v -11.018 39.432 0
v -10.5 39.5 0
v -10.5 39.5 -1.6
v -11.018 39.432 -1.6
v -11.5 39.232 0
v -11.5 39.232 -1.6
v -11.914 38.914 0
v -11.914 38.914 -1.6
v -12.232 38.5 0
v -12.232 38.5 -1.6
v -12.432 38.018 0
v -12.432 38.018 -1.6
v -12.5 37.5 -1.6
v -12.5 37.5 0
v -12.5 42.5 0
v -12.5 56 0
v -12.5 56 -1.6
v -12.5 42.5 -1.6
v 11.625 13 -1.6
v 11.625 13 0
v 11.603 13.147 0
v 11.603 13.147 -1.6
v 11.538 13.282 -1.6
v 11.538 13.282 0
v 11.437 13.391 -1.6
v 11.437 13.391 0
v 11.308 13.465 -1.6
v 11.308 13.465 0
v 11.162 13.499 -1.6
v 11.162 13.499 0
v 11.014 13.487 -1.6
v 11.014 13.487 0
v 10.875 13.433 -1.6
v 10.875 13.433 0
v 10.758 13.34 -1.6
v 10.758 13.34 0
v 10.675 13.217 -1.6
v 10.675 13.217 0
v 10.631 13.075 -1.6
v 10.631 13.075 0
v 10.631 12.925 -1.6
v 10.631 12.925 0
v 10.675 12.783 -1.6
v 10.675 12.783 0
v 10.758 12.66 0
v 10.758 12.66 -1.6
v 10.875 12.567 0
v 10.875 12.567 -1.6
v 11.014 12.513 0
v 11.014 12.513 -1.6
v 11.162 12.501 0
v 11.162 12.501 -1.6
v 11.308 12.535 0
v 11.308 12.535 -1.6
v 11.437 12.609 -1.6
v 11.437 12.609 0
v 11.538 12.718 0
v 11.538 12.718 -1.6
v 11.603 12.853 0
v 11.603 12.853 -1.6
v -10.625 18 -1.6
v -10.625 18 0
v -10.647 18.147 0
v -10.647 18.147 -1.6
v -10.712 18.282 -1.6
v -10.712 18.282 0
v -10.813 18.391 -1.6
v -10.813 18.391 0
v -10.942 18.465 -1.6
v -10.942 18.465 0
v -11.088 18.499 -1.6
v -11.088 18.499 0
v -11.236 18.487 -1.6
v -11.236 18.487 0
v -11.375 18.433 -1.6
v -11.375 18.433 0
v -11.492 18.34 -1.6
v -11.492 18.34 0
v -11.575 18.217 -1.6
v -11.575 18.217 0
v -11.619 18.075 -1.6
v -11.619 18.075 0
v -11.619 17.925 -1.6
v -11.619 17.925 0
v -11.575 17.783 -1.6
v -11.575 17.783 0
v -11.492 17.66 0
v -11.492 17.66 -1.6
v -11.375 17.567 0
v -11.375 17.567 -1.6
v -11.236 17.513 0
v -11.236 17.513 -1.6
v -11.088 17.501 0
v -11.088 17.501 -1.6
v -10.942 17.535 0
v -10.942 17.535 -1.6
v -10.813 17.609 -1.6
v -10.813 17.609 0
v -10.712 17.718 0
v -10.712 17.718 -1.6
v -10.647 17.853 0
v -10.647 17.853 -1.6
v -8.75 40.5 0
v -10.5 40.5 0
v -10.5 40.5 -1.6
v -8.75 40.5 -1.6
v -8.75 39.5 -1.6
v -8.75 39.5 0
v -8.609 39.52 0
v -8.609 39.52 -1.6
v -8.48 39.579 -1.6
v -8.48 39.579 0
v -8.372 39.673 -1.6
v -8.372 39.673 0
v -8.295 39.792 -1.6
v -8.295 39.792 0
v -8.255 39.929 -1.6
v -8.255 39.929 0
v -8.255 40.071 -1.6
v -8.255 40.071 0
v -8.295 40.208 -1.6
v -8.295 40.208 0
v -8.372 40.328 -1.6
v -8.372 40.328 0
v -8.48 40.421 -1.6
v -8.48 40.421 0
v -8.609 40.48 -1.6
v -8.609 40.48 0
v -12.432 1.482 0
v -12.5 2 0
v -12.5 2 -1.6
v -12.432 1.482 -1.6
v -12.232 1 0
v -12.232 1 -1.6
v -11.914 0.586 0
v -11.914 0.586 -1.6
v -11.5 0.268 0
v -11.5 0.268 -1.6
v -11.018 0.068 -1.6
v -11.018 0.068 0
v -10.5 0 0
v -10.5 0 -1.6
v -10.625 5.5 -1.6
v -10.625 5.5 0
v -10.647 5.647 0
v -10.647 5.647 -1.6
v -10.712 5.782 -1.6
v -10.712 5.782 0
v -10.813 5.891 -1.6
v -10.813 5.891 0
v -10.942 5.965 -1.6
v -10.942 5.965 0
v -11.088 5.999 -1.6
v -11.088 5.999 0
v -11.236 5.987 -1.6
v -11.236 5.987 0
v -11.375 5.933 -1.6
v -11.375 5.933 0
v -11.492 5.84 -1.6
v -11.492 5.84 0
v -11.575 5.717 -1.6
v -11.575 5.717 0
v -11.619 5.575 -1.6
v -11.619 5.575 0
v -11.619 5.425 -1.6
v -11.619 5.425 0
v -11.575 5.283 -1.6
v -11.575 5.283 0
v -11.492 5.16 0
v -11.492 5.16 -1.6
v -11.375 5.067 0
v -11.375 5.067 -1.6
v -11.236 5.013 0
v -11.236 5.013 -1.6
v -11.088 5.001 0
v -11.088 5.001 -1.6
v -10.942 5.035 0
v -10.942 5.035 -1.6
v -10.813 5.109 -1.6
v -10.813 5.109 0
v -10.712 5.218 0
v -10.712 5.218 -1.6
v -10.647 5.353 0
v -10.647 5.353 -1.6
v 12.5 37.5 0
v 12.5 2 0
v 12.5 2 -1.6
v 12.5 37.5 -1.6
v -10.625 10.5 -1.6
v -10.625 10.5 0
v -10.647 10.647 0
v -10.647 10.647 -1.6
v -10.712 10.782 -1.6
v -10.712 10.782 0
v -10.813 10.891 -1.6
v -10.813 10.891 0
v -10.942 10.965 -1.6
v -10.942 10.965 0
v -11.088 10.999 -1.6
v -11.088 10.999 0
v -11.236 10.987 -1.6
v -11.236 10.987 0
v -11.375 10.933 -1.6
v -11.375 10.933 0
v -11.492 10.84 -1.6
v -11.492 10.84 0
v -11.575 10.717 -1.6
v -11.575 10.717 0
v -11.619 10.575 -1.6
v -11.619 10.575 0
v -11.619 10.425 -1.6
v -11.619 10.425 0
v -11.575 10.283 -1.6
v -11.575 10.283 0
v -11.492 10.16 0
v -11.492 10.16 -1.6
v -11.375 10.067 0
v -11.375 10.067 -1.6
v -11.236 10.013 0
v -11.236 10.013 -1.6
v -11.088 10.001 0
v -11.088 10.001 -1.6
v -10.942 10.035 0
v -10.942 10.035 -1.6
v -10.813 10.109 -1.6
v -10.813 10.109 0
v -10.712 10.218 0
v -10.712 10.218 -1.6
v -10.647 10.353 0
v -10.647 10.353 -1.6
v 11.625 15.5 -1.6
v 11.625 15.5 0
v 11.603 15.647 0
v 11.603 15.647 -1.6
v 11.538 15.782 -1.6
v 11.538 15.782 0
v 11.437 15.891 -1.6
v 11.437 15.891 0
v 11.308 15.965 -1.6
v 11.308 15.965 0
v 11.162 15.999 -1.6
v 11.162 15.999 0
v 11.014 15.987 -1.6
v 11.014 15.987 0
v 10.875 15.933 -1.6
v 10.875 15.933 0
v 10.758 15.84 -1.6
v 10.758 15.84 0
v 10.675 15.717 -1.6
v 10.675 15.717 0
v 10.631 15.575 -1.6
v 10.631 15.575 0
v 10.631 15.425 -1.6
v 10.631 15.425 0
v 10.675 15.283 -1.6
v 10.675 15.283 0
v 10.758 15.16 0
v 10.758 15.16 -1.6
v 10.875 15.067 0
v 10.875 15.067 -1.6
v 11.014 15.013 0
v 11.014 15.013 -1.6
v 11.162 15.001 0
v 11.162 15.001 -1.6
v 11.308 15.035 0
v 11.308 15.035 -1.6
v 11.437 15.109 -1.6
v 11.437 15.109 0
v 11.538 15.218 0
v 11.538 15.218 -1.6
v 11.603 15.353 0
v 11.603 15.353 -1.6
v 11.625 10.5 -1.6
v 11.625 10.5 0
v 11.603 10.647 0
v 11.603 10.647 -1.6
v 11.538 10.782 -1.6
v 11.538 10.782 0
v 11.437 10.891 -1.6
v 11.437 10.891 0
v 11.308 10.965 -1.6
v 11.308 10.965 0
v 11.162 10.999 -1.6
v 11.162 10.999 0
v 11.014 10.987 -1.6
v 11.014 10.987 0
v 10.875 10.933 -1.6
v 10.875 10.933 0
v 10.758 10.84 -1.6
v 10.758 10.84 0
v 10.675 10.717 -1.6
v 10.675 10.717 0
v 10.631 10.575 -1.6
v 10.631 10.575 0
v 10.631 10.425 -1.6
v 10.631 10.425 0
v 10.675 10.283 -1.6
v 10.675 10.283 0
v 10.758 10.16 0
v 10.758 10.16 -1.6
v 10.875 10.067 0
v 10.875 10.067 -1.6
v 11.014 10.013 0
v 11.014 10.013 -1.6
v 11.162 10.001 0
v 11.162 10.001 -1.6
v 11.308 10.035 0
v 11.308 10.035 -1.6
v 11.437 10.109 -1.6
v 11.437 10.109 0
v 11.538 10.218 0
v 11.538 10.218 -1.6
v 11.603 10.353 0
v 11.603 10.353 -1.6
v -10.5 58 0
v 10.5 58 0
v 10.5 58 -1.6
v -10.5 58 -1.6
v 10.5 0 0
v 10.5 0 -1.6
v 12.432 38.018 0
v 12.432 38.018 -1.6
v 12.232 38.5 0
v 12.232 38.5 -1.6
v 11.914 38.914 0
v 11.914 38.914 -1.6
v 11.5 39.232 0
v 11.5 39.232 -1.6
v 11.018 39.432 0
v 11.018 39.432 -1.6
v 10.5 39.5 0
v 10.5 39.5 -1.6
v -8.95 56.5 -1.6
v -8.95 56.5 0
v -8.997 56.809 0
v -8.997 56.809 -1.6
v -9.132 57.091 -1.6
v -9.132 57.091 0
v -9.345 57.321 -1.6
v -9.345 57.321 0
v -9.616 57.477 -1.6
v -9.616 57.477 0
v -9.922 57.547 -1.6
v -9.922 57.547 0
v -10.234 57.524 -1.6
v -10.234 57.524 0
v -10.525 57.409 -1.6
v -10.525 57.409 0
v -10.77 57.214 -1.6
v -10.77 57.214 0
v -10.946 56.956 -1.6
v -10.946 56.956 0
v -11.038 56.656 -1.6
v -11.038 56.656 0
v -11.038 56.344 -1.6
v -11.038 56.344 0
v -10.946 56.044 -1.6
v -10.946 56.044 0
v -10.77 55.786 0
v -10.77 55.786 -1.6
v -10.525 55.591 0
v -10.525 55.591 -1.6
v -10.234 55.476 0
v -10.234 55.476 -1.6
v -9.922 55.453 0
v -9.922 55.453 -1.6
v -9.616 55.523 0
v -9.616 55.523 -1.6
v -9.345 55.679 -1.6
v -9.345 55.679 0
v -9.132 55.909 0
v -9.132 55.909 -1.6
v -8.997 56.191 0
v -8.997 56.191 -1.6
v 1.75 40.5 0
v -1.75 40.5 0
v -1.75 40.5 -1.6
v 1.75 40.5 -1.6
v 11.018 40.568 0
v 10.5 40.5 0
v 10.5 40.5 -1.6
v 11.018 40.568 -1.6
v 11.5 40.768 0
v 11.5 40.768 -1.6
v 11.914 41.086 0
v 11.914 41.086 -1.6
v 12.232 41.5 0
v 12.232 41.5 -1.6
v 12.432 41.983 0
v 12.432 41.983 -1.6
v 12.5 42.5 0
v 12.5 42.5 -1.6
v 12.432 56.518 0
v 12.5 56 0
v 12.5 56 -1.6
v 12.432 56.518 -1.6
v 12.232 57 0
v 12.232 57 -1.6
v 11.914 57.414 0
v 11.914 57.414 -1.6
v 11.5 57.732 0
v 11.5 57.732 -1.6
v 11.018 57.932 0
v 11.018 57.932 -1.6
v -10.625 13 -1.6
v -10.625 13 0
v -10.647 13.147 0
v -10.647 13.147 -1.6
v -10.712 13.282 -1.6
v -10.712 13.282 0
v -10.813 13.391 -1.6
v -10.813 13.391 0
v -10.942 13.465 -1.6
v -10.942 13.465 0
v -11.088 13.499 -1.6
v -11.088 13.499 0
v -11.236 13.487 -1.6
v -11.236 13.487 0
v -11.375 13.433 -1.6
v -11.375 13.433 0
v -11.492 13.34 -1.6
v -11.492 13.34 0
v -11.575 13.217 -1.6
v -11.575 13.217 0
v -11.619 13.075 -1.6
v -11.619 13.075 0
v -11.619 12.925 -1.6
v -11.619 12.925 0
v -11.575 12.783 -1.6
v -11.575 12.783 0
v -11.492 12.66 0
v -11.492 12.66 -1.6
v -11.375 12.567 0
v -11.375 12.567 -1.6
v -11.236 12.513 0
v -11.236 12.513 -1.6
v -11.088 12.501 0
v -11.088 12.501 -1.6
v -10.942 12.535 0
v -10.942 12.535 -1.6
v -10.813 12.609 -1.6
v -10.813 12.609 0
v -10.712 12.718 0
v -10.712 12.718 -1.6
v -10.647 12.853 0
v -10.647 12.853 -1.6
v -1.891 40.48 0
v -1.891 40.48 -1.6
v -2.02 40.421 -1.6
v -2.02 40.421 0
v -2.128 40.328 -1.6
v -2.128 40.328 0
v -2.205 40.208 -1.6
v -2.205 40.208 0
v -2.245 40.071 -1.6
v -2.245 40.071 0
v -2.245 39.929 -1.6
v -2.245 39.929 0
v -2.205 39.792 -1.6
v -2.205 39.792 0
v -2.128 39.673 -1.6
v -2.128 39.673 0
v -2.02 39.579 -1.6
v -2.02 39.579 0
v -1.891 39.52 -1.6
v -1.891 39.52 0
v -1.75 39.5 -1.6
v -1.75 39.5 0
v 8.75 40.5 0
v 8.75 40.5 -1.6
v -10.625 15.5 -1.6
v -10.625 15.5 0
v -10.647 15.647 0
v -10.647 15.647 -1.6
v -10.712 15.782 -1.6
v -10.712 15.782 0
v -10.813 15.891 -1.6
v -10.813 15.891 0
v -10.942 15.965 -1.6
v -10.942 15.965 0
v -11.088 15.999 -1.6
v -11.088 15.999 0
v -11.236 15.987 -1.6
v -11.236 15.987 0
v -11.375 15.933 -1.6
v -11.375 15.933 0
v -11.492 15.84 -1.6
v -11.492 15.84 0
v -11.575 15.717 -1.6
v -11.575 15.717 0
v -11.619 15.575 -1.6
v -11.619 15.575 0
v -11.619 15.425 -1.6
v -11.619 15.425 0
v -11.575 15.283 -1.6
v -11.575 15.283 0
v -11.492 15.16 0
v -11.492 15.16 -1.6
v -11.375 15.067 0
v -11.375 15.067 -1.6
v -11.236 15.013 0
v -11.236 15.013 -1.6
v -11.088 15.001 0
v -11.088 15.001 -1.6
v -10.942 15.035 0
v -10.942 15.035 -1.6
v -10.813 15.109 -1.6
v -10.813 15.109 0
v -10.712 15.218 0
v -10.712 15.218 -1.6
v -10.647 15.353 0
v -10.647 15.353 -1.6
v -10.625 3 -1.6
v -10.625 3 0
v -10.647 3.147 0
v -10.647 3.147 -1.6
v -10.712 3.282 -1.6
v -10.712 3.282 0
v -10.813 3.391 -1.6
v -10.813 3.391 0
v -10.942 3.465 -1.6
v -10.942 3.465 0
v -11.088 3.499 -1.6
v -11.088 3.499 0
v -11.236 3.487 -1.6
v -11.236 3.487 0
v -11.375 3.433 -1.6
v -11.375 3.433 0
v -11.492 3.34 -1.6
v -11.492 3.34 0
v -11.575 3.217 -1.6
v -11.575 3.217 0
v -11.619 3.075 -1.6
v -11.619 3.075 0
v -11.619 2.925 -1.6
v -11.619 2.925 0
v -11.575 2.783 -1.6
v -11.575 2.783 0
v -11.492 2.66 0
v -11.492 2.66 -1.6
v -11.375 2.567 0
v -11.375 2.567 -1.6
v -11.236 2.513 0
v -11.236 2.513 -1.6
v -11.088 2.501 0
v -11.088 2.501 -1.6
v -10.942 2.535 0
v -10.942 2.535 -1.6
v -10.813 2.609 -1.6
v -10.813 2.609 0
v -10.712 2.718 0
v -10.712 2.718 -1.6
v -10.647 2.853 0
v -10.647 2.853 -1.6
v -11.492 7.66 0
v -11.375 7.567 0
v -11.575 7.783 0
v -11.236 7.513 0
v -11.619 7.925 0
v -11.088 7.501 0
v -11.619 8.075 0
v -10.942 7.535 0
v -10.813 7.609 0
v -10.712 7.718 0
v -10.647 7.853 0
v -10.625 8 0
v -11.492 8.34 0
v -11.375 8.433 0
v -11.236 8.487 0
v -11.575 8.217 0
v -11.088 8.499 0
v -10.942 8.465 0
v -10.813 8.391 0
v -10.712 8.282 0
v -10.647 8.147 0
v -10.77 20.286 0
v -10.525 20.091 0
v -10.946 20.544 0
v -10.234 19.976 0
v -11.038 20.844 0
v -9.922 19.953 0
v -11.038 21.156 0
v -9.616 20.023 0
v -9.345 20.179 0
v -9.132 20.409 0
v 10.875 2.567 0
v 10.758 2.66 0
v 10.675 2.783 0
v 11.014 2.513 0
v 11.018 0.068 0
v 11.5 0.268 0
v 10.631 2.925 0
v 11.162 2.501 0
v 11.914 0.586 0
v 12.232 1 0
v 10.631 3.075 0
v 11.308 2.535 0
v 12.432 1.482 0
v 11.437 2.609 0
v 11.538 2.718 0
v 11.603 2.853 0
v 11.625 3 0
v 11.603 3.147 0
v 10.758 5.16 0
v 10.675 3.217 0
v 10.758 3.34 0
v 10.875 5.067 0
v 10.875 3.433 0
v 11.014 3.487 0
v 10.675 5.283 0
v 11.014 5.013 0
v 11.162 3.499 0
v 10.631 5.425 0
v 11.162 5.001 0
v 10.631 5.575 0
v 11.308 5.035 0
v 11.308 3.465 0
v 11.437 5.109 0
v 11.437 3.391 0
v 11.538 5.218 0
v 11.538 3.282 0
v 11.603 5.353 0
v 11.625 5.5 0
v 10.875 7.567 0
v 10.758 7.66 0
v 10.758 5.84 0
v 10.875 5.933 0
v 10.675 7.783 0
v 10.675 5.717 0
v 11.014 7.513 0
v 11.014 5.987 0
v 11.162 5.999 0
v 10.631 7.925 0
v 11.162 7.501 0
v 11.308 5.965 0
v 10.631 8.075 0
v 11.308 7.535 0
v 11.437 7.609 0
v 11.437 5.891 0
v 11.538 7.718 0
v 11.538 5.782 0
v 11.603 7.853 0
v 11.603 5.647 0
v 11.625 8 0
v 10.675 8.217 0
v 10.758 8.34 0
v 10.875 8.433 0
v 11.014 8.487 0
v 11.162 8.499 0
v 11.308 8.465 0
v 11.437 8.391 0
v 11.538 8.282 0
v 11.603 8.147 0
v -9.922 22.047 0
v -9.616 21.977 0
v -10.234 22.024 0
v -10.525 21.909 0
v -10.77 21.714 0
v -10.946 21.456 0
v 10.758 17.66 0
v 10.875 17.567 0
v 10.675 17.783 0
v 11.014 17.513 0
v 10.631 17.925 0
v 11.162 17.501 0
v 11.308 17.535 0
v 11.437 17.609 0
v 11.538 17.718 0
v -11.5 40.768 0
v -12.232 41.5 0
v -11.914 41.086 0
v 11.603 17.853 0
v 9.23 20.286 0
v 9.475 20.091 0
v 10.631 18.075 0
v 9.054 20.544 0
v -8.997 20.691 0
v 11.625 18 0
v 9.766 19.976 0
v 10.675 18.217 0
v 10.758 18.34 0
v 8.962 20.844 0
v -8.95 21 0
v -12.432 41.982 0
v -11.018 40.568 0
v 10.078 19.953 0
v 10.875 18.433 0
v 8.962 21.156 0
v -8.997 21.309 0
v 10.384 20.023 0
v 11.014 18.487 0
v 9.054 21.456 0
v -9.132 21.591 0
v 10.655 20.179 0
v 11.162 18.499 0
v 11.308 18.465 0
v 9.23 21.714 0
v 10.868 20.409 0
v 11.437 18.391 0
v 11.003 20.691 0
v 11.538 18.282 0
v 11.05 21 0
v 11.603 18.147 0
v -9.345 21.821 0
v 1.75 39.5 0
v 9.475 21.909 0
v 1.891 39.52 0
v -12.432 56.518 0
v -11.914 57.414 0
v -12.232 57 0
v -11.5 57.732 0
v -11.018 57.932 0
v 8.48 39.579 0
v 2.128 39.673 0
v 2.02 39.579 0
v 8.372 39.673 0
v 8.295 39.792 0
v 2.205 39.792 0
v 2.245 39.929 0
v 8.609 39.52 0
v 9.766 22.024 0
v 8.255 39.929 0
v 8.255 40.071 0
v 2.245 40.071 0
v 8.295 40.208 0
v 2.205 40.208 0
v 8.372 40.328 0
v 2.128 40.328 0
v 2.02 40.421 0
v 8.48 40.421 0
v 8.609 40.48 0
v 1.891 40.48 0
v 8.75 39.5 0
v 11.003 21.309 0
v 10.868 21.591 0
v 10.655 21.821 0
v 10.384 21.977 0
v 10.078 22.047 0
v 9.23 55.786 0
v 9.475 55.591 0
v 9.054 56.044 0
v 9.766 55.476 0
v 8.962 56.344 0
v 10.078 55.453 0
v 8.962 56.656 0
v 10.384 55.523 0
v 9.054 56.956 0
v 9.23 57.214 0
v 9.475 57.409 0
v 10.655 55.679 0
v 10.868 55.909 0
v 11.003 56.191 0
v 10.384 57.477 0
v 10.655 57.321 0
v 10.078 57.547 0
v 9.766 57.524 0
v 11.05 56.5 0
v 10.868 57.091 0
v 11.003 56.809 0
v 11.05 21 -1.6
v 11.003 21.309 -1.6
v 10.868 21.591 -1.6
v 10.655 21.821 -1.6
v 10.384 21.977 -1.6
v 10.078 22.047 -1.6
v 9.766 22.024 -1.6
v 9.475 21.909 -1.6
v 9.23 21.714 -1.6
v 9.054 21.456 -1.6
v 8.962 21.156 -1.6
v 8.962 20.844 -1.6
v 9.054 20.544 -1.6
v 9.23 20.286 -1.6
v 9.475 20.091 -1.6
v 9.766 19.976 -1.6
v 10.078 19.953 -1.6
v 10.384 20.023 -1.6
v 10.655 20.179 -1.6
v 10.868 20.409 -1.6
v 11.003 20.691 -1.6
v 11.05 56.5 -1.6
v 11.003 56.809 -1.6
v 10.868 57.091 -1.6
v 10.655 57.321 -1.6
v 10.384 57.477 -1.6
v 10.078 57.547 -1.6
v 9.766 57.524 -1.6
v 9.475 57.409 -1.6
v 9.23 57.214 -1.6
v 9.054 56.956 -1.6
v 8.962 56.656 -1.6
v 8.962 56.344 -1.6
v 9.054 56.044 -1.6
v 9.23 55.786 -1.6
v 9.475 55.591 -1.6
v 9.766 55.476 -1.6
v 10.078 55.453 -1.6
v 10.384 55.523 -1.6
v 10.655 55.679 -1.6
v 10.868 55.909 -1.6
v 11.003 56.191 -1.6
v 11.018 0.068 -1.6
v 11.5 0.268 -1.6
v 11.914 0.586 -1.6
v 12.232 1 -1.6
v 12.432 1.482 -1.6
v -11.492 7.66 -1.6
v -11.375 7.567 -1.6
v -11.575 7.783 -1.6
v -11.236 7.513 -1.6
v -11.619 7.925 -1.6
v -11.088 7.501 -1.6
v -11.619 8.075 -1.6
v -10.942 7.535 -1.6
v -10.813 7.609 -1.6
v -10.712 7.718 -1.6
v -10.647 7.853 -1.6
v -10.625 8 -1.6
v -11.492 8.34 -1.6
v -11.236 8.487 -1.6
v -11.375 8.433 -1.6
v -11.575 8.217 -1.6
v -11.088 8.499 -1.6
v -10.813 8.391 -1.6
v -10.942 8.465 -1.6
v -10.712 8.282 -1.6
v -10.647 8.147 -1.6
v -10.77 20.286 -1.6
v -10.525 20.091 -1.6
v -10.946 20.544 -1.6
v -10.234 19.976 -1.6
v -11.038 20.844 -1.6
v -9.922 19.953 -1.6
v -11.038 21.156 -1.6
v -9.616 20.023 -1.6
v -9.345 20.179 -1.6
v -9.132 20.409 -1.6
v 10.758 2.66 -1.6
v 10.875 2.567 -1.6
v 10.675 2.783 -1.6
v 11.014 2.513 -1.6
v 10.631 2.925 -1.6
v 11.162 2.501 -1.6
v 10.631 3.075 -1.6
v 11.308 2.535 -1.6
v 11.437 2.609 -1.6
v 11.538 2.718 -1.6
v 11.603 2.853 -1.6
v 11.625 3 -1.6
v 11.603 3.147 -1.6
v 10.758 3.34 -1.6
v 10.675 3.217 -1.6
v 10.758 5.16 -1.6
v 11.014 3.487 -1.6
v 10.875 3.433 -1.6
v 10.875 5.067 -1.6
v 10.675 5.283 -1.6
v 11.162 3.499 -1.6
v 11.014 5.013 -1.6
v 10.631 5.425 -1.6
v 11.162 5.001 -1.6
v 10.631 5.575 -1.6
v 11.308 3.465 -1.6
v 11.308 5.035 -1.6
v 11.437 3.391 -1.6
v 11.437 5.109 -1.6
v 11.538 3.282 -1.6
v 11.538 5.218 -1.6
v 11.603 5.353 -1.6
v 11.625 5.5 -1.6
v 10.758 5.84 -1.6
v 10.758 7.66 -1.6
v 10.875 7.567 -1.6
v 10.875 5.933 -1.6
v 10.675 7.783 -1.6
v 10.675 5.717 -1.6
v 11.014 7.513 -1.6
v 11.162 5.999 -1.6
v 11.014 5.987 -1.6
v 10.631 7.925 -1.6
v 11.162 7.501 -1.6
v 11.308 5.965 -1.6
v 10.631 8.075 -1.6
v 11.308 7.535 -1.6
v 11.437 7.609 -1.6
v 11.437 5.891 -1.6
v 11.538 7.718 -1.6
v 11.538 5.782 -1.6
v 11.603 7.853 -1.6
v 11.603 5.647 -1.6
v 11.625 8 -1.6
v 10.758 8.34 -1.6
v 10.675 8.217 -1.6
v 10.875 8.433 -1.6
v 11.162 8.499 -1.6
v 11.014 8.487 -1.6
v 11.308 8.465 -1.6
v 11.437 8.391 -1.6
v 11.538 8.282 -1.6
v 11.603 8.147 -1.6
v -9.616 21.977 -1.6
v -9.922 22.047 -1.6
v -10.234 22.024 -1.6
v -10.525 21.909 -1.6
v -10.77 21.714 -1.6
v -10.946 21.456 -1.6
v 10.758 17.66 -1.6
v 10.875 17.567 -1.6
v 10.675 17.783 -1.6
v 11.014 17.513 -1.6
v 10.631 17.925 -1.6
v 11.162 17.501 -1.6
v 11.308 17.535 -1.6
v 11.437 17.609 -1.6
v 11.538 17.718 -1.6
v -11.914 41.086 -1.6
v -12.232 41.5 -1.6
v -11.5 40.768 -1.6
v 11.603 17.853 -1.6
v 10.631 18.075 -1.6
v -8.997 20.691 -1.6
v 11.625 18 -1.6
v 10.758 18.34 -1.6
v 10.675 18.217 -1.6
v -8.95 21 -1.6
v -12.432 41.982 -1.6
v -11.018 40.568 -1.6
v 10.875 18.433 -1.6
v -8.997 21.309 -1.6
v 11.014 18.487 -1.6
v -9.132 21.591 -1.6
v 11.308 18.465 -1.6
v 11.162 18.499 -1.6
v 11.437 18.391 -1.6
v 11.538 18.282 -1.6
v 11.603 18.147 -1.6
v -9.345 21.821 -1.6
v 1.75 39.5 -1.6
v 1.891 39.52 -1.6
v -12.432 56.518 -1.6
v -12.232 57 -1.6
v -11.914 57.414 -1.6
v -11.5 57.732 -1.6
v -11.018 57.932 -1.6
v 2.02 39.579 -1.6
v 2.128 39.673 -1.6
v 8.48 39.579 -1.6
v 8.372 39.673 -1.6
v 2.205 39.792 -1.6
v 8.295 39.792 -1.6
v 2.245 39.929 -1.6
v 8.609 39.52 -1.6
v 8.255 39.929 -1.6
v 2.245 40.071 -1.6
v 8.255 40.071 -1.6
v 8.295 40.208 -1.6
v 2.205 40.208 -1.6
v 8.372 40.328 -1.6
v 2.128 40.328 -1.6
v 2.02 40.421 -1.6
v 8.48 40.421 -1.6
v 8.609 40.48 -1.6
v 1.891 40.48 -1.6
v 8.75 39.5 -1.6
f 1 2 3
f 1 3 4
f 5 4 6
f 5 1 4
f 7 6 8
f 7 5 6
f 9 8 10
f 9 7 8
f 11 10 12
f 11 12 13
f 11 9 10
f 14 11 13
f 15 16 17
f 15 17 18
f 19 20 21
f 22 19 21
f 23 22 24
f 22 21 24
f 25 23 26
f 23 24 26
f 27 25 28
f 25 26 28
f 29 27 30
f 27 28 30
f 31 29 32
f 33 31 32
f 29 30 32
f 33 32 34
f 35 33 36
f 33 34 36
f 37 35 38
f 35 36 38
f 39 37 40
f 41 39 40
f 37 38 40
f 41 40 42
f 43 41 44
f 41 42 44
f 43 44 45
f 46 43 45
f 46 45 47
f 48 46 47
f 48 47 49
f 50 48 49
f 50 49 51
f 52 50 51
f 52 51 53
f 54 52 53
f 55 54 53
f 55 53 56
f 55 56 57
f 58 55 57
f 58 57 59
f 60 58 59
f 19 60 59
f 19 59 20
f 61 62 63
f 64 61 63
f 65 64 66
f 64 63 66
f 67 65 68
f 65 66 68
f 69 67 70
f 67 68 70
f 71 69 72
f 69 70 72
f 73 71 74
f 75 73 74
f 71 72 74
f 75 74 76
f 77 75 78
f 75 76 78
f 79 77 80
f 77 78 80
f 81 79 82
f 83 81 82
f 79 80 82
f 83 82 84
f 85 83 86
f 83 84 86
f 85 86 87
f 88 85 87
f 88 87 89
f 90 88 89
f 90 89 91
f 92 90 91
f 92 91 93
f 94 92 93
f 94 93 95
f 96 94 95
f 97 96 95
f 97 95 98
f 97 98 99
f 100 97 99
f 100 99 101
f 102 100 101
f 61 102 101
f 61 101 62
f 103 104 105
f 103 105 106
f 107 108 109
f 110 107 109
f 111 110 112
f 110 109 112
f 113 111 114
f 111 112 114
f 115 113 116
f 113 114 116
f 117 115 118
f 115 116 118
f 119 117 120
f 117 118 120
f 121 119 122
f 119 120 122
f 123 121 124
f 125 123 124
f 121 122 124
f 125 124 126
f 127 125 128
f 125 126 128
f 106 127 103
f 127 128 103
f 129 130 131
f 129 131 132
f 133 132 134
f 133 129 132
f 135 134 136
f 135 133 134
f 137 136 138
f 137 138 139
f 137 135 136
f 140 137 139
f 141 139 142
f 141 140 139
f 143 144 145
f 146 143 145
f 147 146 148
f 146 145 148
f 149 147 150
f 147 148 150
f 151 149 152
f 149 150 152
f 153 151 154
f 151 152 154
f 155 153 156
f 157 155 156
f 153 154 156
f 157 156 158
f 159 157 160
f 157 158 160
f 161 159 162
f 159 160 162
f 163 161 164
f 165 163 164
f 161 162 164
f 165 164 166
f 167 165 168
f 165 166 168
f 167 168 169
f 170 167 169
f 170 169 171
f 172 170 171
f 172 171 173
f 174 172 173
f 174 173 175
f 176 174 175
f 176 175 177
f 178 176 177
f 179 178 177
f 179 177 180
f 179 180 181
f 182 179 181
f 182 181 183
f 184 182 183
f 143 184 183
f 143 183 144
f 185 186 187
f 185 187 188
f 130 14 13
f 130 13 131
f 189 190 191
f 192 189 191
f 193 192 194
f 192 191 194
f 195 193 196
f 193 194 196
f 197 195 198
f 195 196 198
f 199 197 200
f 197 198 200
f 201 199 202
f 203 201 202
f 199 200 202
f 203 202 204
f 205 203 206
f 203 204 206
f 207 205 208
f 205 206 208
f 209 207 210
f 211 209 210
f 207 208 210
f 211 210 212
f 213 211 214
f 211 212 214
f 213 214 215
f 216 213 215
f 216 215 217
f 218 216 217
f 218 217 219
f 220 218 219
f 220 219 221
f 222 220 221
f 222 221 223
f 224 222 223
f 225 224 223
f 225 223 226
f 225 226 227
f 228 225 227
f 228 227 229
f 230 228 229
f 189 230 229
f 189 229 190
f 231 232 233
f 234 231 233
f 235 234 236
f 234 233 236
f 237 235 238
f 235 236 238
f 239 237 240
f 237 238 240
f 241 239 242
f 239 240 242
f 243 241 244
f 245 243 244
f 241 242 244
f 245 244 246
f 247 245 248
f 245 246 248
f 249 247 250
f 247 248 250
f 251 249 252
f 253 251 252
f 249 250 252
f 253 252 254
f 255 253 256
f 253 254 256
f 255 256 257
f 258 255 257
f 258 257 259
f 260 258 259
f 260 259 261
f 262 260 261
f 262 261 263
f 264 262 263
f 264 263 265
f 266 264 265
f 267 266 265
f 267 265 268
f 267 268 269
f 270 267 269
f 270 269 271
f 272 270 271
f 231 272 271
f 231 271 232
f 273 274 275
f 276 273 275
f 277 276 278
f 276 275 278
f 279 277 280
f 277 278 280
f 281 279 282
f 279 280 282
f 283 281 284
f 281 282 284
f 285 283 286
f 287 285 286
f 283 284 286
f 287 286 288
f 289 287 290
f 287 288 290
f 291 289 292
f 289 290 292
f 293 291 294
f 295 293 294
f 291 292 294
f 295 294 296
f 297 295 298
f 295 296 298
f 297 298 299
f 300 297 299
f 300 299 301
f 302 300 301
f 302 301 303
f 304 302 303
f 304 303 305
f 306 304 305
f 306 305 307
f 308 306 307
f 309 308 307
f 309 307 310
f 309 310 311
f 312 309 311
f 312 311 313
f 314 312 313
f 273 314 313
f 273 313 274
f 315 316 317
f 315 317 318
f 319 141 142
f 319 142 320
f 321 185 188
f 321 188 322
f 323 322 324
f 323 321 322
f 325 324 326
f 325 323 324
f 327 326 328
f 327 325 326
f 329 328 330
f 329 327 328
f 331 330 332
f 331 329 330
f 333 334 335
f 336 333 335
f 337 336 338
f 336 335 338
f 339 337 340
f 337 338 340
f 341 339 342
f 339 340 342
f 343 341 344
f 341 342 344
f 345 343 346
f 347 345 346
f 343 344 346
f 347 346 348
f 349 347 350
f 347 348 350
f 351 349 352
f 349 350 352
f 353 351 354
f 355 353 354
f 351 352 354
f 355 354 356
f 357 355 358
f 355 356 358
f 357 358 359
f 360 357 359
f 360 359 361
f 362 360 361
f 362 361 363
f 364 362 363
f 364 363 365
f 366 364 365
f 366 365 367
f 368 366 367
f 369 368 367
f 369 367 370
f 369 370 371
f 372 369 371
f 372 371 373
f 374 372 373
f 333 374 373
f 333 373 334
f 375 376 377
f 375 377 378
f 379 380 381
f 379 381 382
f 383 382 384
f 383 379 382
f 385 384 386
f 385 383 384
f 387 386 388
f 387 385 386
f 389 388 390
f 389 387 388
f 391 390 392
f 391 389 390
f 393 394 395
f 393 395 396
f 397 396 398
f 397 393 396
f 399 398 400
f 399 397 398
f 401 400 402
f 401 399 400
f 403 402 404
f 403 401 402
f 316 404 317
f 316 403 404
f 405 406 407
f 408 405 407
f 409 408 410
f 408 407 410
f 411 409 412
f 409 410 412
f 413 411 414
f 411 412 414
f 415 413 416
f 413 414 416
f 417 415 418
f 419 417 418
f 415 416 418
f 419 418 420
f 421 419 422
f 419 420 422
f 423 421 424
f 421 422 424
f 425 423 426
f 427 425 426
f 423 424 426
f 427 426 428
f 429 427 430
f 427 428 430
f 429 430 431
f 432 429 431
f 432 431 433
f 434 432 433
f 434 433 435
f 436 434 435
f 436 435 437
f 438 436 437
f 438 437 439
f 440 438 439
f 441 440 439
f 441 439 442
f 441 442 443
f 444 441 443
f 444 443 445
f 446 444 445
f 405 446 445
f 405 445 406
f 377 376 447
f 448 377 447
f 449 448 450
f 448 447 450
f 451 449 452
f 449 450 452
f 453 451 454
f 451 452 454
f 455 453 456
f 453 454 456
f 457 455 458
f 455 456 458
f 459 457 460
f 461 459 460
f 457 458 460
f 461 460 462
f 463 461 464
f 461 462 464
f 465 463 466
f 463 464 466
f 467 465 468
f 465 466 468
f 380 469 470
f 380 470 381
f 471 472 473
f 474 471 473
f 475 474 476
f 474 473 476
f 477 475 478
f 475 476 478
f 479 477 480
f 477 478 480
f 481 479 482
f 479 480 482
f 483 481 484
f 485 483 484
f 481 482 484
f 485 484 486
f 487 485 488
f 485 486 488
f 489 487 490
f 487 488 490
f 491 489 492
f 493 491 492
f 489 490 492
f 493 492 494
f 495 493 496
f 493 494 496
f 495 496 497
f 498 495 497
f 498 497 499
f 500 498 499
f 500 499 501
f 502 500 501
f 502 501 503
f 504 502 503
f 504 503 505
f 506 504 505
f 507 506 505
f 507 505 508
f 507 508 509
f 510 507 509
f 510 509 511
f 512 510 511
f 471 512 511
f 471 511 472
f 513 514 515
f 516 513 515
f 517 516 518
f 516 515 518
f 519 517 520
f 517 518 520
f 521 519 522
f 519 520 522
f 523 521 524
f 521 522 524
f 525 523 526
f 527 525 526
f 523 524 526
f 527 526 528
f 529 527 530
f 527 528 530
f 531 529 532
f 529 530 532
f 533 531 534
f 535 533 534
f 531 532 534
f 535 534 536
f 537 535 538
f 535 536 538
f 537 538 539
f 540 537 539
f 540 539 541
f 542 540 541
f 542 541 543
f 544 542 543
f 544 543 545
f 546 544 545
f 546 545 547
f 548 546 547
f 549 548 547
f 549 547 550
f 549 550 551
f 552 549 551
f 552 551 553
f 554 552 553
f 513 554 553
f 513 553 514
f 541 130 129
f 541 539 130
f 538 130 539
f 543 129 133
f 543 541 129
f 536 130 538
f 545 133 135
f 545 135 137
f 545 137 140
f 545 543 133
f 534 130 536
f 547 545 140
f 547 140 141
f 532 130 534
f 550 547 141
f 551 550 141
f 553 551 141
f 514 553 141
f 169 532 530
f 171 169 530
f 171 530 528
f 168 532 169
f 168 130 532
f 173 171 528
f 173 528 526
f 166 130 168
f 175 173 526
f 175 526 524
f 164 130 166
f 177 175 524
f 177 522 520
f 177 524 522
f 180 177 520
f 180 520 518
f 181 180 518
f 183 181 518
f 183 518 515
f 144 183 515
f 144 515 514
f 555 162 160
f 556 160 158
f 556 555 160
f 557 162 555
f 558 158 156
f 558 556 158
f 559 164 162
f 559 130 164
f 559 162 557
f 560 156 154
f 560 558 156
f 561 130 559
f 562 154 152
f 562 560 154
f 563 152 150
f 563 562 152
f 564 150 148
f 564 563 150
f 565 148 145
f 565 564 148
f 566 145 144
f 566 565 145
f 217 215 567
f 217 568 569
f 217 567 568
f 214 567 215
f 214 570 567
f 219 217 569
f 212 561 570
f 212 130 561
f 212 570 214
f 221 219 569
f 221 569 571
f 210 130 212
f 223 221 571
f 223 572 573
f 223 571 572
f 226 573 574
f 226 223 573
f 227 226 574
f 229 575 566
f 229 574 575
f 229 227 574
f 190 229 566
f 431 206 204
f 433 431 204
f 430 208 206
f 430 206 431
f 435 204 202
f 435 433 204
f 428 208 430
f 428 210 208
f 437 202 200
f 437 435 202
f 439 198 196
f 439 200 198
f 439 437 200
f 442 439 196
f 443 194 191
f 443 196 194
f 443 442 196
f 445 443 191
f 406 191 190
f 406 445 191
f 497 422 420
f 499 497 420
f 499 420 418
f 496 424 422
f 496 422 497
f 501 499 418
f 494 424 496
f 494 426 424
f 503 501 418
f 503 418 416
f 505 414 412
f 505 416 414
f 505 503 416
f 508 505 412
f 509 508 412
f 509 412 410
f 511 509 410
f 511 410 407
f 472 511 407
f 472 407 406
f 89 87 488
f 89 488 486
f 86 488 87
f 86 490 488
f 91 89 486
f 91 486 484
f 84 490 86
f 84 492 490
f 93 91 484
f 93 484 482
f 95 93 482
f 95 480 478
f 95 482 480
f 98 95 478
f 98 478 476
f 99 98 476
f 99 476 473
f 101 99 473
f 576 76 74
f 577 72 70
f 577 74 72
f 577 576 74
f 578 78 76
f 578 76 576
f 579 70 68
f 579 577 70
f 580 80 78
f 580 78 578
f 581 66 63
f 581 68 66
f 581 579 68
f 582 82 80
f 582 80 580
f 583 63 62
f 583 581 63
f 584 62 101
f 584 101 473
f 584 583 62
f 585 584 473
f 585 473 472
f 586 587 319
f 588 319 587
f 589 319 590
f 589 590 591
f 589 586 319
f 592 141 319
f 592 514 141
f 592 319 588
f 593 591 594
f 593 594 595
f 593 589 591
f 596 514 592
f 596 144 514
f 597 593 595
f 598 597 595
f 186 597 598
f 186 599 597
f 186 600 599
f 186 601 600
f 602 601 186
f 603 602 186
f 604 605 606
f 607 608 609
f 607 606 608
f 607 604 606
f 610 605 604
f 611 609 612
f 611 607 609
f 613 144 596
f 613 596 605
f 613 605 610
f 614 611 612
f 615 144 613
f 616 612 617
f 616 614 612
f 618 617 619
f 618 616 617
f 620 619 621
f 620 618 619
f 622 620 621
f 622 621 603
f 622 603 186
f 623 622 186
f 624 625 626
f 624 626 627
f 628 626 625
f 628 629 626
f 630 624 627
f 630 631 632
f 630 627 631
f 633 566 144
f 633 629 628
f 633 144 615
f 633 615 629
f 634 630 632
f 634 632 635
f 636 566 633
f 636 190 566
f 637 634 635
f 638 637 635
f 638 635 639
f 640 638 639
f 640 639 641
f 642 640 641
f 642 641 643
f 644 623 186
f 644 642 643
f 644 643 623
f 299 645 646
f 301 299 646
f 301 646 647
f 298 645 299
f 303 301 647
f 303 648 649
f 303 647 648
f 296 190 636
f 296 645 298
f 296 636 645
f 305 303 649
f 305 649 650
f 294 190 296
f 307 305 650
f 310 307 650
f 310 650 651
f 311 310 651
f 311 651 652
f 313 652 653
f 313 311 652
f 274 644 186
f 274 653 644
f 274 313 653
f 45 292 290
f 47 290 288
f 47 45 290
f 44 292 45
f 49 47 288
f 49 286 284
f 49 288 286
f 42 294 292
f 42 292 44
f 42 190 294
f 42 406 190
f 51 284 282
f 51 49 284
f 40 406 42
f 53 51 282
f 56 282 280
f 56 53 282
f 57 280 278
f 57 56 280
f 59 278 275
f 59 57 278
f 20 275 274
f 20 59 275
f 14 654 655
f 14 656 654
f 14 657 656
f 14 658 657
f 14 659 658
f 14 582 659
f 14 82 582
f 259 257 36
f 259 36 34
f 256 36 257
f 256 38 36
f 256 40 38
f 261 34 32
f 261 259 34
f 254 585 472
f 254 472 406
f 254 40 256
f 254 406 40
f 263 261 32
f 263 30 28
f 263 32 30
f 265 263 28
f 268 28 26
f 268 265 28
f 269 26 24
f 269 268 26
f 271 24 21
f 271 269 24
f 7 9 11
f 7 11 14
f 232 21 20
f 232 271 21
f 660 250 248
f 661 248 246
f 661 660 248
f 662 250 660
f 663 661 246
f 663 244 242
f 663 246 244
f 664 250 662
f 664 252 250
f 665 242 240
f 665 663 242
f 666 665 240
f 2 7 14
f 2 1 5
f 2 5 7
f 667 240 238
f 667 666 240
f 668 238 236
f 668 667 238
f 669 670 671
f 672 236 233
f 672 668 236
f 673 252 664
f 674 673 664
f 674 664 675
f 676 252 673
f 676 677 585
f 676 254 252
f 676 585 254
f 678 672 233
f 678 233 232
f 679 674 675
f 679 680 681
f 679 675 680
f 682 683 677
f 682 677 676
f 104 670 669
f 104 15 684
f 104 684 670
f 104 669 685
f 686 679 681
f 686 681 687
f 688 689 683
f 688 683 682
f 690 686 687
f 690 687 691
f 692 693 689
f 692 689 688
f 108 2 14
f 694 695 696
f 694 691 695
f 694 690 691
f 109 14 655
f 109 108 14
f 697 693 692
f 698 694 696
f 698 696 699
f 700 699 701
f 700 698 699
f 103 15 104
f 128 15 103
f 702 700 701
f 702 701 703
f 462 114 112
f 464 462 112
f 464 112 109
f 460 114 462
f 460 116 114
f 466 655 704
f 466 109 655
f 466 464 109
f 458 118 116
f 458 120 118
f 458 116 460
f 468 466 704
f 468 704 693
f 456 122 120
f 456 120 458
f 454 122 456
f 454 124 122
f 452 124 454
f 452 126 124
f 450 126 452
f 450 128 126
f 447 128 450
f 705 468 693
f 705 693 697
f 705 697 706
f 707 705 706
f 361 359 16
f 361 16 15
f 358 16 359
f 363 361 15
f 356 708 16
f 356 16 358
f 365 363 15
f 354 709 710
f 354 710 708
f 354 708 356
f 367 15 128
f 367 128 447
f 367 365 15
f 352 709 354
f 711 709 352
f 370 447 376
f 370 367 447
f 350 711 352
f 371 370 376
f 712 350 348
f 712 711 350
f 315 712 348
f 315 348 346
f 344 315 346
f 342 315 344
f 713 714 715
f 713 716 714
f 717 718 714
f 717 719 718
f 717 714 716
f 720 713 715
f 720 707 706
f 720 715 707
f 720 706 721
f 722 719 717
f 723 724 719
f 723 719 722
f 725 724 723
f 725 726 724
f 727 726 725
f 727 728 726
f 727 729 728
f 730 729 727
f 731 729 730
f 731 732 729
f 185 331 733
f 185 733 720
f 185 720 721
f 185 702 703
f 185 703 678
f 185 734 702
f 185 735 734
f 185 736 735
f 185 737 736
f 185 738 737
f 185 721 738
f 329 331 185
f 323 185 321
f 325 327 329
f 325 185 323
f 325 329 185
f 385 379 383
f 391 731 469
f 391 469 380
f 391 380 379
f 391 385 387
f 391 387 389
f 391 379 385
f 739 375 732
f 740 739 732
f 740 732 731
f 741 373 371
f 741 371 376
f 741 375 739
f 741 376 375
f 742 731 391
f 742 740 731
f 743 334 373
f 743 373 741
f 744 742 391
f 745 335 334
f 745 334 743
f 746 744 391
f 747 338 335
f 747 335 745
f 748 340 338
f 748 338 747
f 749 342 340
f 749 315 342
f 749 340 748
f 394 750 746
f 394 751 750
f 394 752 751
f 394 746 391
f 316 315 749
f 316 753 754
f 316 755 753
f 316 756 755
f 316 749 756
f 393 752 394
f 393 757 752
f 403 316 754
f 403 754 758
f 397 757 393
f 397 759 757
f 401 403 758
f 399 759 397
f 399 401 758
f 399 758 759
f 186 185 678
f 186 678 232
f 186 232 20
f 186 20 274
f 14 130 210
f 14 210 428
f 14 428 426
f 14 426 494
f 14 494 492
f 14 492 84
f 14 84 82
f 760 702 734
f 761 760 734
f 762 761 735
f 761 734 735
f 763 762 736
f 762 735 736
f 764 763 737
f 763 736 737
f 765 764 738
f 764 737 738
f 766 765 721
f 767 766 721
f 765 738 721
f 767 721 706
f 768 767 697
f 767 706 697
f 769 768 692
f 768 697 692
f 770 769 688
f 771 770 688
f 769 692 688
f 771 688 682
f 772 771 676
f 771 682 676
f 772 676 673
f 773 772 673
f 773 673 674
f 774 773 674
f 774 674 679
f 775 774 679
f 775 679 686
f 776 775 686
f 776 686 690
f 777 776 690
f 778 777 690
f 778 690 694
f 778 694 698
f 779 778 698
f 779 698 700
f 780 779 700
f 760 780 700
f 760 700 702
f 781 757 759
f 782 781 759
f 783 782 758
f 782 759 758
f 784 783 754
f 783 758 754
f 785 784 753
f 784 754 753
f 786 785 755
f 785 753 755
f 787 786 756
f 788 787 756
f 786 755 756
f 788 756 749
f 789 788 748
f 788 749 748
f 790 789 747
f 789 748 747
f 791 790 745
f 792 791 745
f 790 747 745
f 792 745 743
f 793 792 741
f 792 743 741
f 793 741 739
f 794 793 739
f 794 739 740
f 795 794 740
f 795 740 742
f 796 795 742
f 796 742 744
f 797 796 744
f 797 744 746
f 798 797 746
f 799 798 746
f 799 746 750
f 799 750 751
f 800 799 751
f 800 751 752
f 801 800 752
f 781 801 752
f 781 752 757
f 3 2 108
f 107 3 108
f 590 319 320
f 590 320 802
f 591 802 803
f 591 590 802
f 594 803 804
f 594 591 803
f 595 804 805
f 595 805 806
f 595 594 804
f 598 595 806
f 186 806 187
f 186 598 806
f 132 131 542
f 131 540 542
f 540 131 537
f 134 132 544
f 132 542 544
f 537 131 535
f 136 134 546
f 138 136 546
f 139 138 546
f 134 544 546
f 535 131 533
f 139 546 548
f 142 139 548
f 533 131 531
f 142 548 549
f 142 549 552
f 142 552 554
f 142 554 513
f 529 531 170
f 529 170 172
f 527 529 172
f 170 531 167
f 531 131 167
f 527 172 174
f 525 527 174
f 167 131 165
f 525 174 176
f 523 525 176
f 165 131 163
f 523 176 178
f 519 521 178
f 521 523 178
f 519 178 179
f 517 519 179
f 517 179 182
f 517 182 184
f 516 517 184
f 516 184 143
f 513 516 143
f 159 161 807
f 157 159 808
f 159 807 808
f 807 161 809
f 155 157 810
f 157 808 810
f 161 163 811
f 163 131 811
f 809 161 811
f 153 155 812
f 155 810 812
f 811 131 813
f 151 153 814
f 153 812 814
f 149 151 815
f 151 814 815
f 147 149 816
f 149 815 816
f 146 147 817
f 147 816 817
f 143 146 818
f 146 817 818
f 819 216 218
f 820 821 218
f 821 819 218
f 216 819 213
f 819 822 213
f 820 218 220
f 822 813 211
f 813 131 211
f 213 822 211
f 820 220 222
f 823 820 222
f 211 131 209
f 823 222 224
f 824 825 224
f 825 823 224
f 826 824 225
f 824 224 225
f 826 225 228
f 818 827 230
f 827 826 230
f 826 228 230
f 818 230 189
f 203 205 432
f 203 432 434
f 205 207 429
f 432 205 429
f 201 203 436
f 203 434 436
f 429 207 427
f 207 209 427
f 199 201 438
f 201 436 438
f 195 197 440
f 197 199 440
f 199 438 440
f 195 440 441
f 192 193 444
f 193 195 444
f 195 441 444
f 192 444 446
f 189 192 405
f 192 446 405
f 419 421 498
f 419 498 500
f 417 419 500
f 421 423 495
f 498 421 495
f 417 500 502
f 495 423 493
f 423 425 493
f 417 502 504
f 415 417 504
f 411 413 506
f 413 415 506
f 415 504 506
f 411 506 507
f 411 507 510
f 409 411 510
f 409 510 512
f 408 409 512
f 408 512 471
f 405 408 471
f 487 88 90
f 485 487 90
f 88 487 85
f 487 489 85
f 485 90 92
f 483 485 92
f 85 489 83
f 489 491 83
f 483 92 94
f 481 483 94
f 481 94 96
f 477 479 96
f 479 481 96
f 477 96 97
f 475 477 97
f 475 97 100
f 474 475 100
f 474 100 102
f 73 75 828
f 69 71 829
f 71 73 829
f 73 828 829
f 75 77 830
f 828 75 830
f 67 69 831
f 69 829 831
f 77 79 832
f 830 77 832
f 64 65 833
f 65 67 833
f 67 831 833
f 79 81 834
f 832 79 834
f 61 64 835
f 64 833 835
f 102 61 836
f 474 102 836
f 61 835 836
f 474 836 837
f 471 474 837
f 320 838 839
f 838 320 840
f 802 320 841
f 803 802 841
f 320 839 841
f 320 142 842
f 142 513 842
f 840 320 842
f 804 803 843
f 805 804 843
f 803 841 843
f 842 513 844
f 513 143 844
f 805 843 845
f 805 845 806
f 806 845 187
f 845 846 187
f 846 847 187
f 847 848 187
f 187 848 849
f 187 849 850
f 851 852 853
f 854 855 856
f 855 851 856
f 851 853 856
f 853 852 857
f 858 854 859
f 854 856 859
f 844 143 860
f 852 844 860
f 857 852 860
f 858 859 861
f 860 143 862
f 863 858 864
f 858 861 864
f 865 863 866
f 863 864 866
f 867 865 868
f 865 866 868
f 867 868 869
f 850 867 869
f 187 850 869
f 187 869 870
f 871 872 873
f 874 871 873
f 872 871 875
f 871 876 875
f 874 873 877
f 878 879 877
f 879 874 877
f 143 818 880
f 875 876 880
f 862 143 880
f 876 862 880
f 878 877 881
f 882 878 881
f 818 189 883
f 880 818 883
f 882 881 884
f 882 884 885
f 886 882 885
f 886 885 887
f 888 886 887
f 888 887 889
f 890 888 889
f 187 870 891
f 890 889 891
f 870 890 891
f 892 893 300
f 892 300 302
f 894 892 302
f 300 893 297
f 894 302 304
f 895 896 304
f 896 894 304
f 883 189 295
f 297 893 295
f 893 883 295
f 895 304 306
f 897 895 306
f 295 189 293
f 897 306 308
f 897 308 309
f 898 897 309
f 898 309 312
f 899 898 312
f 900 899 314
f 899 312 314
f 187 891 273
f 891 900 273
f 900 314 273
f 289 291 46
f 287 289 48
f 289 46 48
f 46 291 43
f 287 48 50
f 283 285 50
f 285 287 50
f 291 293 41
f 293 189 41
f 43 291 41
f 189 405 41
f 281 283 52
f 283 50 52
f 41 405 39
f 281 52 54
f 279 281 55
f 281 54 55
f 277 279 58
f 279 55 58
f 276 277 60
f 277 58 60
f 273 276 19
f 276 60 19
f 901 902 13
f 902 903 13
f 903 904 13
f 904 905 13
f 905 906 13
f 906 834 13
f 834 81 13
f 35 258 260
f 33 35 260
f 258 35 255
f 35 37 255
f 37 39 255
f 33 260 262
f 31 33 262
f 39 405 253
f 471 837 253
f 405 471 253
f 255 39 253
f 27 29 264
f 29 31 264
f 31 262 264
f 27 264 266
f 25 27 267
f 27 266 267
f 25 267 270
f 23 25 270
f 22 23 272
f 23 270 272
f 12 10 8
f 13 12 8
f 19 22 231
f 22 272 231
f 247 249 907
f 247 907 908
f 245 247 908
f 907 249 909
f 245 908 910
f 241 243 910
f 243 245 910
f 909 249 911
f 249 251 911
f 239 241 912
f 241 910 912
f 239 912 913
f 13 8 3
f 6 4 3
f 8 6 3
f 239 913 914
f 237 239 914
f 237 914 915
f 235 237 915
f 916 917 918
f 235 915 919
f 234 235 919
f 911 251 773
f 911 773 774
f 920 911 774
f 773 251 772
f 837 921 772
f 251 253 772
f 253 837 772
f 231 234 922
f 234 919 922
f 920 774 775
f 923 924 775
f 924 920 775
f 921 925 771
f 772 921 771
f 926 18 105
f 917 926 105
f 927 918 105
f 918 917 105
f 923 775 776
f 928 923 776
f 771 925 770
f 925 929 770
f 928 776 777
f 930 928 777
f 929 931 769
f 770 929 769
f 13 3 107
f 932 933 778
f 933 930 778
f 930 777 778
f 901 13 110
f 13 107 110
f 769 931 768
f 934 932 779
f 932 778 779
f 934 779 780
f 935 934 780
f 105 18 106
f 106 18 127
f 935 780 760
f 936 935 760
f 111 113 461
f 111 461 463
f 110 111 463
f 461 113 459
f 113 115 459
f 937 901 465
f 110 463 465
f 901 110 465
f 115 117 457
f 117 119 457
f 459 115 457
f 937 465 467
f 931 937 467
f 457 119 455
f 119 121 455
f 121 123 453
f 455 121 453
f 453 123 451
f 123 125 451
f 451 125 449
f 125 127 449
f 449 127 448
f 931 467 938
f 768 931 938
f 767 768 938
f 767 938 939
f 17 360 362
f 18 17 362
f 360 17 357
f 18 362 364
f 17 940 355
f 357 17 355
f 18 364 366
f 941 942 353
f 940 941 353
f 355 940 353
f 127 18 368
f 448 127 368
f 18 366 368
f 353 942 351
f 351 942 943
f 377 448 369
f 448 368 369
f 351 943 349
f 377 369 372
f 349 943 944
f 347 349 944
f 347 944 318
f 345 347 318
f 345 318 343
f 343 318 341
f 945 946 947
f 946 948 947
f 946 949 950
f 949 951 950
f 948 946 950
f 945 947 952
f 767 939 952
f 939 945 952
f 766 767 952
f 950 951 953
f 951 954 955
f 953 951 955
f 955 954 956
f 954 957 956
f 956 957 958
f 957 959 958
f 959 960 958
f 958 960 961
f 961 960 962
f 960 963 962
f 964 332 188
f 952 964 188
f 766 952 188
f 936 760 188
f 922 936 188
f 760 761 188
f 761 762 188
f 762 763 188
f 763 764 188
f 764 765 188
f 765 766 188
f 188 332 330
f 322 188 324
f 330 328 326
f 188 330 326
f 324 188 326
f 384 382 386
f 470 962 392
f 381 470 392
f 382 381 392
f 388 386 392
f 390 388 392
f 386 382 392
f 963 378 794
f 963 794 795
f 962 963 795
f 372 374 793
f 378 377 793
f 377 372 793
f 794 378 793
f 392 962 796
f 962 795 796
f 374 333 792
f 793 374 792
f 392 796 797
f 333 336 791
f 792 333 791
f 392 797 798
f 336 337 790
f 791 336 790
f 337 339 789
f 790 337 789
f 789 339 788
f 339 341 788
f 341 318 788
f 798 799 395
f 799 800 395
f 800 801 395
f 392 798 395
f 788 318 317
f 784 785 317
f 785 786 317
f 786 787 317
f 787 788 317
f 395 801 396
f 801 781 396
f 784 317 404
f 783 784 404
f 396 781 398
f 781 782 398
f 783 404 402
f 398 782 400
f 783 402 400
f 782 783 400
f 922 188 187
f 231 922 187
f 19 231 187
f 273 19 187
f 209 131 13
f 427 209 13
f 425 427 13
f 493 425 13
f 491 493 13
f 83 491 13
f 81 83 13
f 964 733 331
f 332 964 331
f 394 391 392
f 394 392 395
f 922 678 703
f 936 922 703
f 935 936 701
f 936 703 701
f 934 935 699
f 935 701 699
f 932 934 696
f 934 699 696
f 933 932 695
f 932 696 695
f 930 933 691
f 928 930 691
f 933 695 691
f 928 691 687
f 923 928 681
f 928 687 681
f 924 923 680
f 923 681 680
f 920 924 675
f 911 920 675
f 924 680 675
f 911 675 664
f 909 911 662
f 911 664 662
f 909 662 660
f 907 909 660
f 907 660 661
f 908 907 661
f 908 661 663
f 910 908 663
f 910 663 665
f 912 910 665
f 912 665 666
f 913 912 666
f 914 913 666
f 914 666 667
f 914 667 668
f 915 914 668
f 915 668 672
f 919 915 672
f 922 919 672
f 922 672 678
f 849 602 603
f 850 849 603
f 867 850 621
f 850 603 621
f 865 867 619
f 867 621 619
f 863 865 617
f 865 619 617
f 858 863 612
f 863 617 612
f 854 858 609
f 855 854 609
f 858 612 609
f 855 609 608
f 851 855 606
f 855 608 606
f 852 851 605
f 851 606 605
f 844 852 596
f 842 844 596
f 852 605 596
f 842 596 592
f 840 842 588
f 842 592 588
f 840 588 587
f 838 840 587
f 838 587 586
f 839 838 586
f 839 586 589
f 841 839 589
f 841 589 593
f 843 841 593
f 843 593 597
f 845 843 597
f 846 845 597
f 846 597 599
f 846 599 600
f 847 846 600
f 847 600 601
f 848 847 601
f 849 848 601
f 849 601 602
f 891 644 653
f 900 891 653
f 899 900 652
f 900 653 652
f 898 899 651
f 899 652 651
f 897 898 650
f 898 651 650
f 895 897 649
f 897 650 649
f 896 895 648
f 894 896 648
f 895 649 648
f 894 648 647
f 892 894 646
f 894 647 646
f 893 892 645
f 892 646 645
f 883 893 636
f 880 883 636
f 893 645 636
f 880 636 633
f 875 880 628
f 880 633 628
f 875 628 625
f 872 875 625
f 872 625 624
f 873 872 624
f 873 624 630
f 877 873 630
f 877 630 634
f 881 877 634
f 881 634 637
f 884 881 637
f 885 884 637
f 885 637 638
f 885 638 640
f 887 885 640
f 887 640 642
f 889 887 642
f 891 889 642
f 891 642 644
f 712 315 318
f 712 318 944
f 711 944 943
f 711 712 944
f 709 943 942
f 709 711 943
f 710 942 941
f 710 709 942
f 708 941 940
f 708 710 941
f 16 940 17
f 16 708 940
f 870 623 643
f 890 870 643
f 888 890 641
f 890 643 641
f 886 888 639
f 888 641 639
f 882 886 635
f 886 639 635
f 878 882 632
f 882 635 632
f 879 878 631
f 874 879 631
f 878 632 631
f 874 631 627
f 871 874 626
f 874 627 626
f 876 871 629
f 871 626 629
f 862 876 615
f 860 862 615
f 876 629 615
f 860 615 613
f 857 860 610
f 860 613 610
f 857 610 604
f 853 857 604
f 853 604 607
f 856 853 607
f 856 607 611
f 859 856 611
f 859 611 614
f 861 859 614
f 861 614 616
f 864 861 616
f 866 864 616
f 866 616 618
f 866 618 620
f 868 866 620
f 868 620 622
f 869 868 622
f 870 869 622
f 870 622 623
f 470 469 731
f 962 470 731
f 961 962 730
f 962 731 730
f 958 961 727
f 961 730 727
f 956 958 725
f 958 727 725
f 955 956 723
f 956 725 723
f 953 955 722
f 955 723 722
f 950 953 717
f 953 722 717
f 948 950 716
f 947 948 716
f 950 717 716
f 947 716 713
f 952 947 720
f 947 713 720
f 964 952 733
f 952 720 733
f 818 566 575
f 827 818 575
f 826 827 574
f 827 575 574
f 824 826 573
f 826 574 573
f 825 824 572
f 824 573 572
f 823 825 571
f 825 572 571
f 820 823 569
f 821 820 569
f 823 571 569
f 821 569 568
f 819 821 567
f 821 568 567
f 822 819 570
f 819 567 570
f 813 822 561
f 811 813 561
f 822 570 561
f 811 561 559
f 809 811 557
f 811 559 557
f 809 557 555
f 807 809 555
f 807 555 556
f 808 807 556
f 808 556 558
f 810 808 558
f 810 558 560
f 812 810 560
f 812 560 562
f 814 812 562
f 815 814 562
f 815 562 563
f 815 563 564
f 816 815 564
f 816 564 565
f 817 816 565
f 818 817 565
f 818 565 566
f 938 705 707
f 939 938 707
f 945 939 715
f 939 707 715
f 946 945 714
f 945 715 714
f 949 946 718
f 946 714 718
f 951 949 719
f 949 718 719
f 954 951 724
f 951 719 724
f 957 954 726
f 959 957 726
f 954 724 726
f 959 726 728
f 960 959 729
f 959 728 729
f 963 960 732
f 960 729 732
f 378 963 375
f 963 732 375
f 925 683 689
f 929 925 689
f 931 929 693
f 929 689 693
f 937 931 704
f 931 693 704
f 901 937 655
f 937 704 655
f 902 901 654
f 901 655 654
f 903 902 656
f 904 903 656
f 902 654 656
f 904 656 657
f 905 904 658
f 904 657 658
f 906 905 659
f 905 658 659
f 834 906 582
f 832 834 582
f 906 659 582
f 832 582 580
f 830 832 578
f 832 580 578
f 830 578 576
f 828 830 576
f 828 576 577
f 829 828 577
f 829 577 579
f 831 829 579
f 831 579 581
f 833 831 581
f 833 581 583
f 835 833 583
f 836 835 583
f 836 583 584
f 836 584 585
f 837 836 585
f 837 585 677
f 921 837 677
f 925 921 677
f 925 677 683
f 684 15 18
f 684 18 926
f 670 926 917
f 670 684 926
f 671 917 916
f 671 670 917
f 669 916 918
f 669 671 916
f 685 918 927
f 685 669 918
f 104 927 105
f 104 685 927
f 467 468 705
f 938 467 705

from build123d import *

# Parameters (mm, degrees)
PAD_DEPTH       = 1.6
SKETCH001_R     = 0.5
POCKET_DEPTH    = 1.601
SKETCH002_R     = 1.05
POCKET001_DEPTH = 1.601
POCKET002_DEPTH = 1.601


with BuildPart() as part:
    # Sketch → Pad (new body)
    with BuildSketch(Plane.XY):
        with BuildLine():
            Line((-10.5, 0), (10.5, 0))
            ThreePointArc((10.5, 0), (11.914214, 0.585786), (12.5, 2))
            Line((12.5, 2), (12.5, 56))
            ThreePointArc((12.5, 56), (11.914214, 57.414214), (10.5, 58))
            Line((10.5, 58), (-10.5, 58))
            ThreePointArc((-10.5, 58), (-11.914214, 57.414214), (-12.5, 56))
            Line((-12.5, 56), (-12.5, 2))
            ThreePointArc((-12.5, 2), (-11.914214, 0.585786), (-10.5, 0))
        make_face()
    extrude(amount=-PAD_DEPTH)

    # Sketch001 → Pocket (cut, through all)
    with BuildSketch(Plane.XY):
        with Locations((-11.125, 3)):
            Circle(SKETCH001_R)
        with Locations((11.125, 3)):
            Circle(SKETCH001_R)
        with Locations((-11.125, 5.5)):
            Circle(SKETCH001_R)
        with Locations((-11.125, 8)):
            Circle(SKETCH001_R)
        with Locations((-11.125, 10.5)):
            Circle(SKETCH001_R)
        with Locations((-11.125, 13)):
            Circle(SKETCH001_R)
        with Locations((-11.125, 15.5)):
            Circle(SKETCH001_R)
        with Locations((-11.125, 18)):
            Circle(SKETCH001_R)
        with Locations((11.125, 18)):
            Circle(SKETCH001_R)
        with Locations((11.125, 15.5)):
            Circle(SKETCH001_R)
        with Locations((11.125, 13)):
            Circle(SKETCH001_R)
        with Locations((11.125, 10.5)):
            Circle(SKETCH001_R)
        with Locations((11.125, 8)):
            Circle(SKETCH001_R)
        with Locations((11.125, 5.5)):
            Circle(SKETCH001_R)
    extrude(amount=-POCKET_DEPTH, mode=Mode.SUBTRACT)

    # Sketch002 → Pocket001 (cut, through all)
    with BuildSketch(Plane.XY):
        with Locations((-10, 21)):
            Circle(SKETCH002_R)
        with Locations((10, 21)):
            Circle(SKETCH002_R)
        with Locations((10, 56.5)):
            Circle(SKETCH002_R)
        with Locations((-10, 56.5)):
            Circle(SKETCH002_R)
    extrude(amount=-POCKET001_DEPTH, mode=Mode.SUBTRACT)

    # Sketch003 → Pocket002 (cut, through all)
    with BuildSketch(Plane.XY):
        with BuildLine():
            ThreePointArc((-1.75, 40.500236), (-2.250118, 40.000118), (-1.75, 39.5))
            Line((-1.75, 39.5), (1.75, 39.5))
            ThreePointArc((1.75, 39.5), (2.250118, 40.000118), (1.75, 40.500236))
            Line((-1.75, 40.500236), (1.75, 40.500236))
        make_face()
        with BuildLine():
            ThreePointArc((8.75, 40.500236), (8.249882, 40.000118), (8.75, 39.5))
            Line((8.75, 39.5), (10.5, 39.5))
            ThreePointArc((12.5, 37.500001), (11.914213, 38.914214), (10.5, 39.5))
            Line((12.5, 35.000118), (12.5, 37.500001))
            Line((22.5, 35.000118), (12.5, 35.000118))
            Line((22.5, 45.000118), (22.5, 35.000118))
            Line((12.5, 45.000118), (22.5, 45.000118))
            Line((12.5, 42.500236), (12.5, 45.000118))
            ThreePointArc((10.5, 40.500236), (11.914214, 41.086022), (12.5, 42.500236))
            Line((8.75, 40.500236), (10.5, 40.500236))
        make_face()
        with BuildLine():
            ThreePointArc((-8.75, 39.500118), (-8.25, 40.000118), (-8.75, 40.500118))
            Line((-10.5, 40.500118), (-8.75, 40.500118))
            ThreePointArc((-12.5, 42.500118), (-11.914214, 41.085904), (-10.5, 40.500118))
            Line((-12.5, 42.500118), (-12.5, 45.000118))
            Line((-12.5, 45.000118), (-22.5, 45.000118))
            Line((-22.5, 45.000118), (-22.5, 35.000118))
            Line((-22.5, 35.000118), (-12.5, 35.000118))
            Line((-12.5, 35.000118), (-12.5, 37.500118))
            ThreePointArc((-10.5, 39.500118), (-11.914214, 38.914331), (-12.5, 37.500118))
            Line((-10.5, 39.500118), (-8.75, 39.500118))
        make_face()
    extrude(amount=-POCKET002_DEPTH, mode=Mode.SUBTRACT)


solid = part.part
